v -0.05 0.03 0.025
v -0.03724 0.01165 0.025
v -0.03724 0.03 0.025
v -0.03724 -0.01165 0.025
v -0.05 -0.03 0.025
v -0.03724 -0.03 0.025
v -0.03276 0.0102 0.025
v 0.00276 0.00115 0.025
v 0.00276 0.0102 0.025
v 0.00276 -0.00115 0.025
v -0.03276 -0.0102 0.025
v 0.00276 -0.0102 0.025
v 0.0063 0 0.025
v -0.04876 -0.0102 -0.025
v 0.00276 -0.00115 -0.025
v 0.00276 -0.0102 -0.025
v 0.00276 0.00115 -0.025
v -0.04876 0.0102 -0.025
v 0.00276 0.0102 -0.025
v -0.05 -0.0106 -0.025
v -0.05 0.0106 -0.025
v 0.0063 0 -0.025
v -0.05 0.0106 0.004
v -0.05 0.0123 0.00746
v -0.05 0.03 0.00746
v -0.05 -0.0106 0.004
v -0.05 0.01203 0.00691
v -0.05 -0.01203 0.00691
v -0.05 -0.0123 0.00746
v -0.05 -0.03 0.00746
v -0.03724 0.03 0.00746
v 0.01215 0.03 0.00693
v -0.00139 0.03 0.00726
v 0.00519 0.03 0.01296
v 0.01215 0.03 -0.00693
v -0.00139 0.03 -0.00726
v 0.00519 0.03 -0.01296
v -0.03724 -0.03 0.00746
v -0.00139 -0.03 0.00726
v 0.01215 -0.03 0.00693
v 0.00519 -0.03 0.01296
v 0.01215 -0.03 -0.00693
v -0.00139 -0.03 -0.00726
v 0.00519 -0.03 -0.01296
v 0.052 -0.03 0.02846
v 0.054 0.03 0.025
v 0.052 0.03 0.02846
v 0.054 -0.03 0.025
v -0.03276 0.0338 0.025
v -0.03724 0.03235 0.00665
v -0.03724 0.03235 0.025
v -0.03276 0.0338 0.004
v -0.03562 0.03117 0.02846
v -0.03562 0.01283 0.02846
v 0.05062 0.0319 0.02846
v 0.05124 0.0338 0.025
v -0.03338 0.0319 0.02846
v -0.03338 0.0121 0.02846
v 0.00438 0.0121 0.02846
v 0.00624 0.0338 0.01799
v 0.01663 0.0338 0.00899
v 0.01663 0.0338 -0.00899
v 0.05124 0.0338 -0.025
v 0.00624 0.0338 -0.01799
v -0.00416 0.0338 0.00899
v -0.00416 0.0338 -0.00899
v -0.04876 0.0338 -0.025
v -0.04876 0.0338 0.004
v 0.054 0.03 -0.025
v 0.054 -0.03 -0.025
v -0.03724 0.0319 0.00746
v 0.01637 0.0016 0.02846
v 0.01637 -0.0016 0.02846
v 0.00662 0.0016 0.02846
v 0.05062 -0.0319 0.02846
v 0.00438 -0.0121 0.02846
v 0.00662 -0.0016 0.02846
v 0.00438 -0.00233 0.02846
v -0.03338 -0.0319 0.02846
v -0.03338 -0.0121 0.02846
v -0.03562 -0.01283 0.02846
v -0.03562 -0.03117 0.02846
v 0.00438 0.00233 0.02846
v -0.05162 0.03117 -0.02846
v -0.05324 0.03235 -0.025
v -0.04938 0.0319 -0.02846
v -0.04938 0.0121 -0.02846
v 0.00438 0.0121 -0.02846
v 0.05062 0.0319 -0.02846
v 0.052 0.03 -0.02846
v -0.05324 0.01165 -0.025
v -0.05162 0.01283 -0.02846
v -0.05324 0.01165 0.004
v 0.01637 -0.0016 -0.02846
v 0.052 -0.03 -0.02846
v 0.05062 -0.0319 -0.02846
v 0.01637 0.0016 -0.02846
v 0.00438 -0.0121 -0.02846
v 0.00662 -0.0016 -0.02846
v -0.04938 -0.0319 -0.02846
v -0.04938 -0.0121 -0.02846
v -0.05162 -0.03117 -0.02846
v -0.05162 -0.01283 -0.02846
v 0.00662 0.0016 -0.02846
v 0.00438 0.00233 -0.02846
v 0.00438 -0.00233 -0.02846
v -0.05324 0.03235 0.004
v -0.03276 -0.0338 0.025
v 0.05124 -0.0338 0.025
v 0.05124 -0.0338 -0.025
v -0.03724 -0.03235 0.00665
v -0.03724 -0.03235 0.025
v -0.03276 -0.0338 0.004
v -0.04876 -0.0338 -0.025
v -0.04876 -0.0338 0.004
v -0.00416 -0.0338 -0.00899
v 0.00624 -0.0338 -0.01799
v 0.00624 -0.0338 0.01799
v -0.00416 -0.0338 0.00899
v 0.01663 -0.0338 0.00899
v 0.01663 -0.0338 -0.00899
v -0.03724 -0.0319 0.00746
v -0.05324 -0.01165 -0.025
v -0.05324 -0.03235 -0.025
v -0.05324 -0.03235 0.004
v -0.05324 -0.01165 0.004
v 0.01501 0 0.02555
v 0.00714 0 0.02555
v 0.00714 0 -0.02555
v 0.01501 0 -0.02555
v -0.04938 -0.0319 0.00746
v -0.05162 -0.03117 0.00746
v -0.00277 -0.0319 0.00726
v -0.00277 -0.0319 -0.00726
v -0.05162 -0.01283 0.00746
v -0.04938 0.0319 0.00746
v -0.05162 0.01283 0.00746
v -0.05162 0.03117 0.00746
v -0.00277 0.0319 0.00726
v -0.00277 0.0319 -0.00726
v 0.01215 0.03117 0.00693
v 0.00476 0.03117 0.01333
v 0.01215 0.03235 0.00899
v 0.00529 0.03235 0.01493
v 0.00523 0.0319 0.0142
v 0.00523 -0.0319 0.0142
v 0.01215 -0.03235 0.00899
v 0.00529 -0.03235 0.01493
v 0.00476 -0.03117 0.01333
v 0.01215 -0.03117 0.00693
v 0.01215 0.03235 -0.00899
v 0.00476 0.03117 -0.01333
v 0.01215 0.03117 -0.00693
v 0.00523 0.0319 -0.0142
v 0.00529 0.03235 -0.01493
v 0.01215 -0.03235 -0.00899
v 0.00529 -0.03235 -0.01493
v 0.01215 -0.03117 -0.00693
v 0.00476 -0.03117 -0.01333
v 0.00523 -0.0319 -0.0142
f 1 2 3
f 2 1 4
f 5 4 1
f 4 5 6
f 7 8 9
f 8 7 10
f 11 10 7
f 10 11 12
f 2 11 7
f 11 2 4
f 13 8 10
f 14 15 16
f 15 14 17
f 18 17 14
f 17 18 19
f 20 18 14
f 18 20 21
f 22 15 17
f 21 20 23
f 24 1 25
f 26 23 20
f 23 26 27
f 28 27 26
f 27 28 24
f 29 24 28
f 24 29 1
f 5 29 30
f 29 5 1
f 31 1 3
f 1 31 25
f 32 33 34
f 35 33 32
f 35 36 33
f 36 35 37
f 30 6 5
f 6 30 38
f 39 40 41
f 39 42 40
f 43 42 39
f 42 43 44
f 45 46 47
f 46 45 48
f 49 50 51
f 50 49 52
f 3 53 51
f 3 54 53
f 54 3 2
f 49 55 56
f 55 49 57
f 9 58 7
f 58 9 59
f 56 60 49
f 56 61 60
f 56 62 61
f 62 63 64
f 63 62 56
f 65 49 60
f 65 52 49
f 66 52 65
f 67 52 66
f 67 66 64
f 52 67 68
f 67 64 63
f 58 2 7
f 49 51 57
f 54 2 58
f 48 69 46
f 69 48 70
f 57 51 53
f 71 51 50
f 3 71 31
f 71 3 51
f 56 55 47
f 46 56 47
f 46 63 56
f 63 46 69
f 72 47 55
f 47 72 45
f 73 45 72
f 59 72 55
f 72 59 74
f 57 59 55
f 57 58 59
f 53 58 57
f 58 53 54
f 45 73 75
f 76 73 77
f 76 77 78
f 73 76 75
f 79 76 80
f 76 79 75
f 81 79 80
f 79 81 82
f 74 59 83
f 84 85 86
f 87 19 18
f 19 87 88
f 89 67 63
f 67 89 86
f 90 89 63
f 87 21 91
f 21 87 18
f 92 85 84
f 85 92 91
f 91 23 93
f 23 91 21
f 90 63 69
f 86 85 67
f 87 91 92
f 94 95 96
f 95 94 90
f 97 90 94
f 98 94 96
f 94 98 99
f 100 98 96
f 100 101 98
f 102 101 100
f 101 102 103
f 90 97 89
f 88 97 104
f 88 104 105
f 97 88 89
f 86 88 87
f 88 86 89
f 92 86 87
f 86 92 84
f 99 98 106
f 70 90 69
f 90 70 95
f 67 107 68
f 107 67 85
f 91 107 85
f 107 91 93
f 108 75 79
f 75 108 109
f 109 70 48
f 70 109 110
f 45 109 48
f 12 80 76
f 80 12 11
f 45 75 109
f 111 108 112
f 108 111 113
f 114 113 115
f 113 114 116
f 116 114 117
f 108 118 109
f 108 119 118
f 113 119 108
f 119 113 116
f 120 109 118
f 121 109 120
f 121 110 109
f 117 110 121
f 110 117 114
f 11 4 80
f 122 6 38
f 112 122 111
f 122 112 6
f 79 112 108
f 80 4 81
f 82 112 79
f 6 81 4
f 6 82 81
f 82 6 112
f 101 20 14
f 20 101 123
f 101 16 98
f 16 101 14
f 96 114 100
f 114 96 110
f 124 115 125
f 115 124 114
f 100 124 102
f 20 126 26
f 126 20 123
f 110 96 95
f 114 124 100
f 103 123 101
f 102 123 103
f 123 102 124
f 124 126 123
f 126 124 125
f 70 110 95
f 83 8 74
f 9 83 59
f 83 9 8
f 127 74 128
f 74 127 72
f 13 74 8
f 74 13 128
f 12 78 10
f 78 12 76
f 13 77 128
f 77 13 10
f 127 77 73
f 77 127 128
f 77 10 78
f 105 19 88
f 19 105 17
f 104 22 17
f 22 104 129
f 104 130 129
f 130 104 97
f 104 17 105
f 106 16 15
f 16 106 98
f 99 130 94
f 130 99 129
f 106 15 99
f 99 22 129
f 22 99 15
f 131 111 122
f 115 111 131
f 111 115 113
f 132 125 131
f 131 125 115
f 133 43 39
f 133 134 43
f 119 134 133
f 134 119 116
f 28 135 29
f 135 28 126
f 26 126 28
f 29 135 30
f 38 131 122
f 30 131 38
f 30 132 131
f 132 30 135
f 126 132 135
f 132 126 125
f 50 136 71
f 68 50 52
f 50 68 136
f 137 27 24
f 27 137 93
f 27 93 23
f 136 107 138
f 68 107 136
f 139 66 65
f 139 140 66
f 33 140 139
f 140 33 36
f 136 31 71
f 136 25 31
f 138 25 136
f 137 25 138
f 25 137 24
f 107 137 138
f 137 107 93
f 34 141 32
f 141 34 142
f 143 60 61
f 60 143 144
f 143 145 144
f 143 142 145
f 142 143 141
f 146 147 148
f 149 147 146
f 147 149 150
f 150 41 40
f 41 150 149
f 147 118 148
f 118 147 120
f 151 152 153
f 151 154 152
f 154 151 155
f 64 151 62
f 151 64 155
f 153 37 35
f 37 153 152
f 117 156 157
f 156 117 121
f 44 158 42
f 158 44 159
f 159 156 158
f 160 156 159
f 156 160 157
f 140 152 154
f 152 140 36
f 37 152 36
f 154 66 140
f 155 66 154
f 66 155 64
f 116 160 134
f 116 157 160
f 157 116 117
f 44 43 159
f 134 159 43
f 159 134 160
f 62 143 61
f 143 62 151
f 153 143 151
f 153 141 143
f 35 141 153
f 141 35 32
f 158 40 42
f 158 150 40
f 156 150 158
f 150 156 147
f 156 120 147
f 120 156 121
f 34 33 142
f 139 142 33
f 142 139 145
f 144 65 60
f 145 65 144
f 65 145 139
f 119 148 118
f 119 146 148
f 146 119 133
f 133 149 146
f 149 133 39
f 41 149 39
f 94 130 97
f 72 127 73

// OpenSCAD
// Parameters
L = 0.1; //[0.05:0.2:0.001]
W = 0.06; //[0.03:0.12:0.001]
H = 0.05; //[0.025:0.1:0.001]
slot_L = 0.055; //[0.03:0.09:0.001]
slot_W = 0.028; //[0.012:0.045:0.001]
slot_offset_from_tip = 0.0; //[0.0:0.01:0.001]
tine_wall_min = 0.016; //[0.008:0.03:0.001]
end_round_R = 0.03; //[0.015:0.06:0.001]
chamfer_L = 0.015; //[0.005:0.03:0.001]
chamfer_drop = 0.02; //[0.005:0.04:0.001]
hex_flat_AF = 0.018; //[0.01:0.03:0.001]
hex_axis_d = 0.06; //[0.03:0.12:0.001]
hex_center_x_from_rounded_end = 0.02; //[0.005:0.04:0.001]
hex_center_z = 0.025; //[0.01:0.04:0.001]
eps = 0.001; //[0.0005:0.002:0.0005]
hole_leadin_L = 0.006; //[0.002:0.012:0.001]
hole_leadin_scale = 1.25; //[1.05:1.6:0.01]
tine_tip_R = 0.008; //[0.003:0.015:0.001]
edge_fillet_R = 0.004; //[0.001:0.01:0.001]

// Main prismatic body
module main_prismatic_body() {
  cube([L, W, H], center=true);
}

// Rounded end cap
module rounded_end_cap() {
  rotate([90, 0, 0])
    translate([L/2 - min(W/2, H/2, end_round_R), 0, 0])
      cylinder(r=min(W/2, H/2, end_round_R), h=W, center=true);
}

// Rectangular through slot for two tines
module rectangular_through_slot_two_tines() {
  translate([-L/2 + slot_offset_from_tip + (slot_L + eps)/2, 0, 0])
    cube([slot_L + eps, slot_W, H + 2*eps], center=true);
}

// Chamfered tapered end
module chamfered_tapered_end() {
  translate([-L/2 + (chamfer_L + eps)/2, 0, H/2 - (chamfer_drop + eps)/2])
    cube([chamfer_L + eps, W + 2*eps, chamfer_drop + eps], center=true);
}

// Transverse hex through hole
module transverse_hex_through_hole() {
  rotate([90, 0, 0])
    translate([L/2 - min(W/2, H/2, end_round_R) - hex_center_x_from_rounded_end, 0, -H/2 + hex_center_z])
      linear_extrude(height=hex_axis_d + 2*eps, center=true)
        polygon(points=[
          [hex_flat_AF/sqrt(3), hex_flat_AF/2],
          [0, hex_flat_AF],
          [-hex_flat_AF/sqrt(3), hex_flat_AF/2],
          [-hex_flat_AF/sqrt(3), -hex_flat_AF/2],
          [0, -hex_flat_AF],
          [hex_flat_AF/sqrt(3), -hex_flat_AF/2]
        ]);
}

// Small lead-in chamfers on hole (left and right)
module small_lead_in_chamfers_on_hole_left() {
  rotate([90, 0, 0])
    translate([L/2 - min(W/2, H/2, end_round_R) - hex_center_x_from_rounded_end, -W/2 + (hole_leadin_L + eps)/2, -H/2 + hex_center_z])
      linear_extrude(height=hole_leadin_L + eps, center=true)
        polygon(points=[
          [(hex_flat_AF*hole_leadin_scale)/sqrt(3), (hex_flat_AF*hole_leadin_scale)/2],
          [0, hex_flat_AF*hole_leadin_scale],
          [-(hex_flat_AF*hole_leadin_scale)/sqrt(3), (hex_flat_AF*hole_leadin_scale)/2],
          [-(hex_flat_AF*hole_leadin_scale)/sqrt(3), -(hex_flat_AF*hole_leadin_scale)/2],
          [0, -hex_flat_AF*hole_leadin_scale],
          [(hex_flat_AF*hole_leadin_scale)/sqrt(3), -(hex_flat_AF*hole_leadin_scale)/2]
        ]);
}

module small_lead_in_chamfers_on_hole_right() {
  rotate([90, 0, 0])
    translate([L/2 - min(W/2, H/2, end_round_R) - hex_center_x_from_rounded_end, W/2 - (hole_leadin_L + eps)/2, -H/2 + hex_center_z])
      linear_extrude(height=hole_leadin_L + eps, center=true)
        polygon(points=[
          [(hex_flat_AF*hole_leadin_scale)/sqrt(3), (hex_flat_AF*hole_leadin_scale)/2],
          [0, hex_flat_AF*hole_leadin_scale],
          [-(hex_flat_AF*hole_leadin_scale)/sqrt(3), (hex_flat_AF*hole_leadin_scale)/2],
          [-(hex_flat_AF*hole_leadin_scale)/sqrt(3), -(hex_flat_AF*hole_leadin_scale)/2],
          [0, -hex_flat_AF*hole_leadin_scale],
          [(hex_flat_AF*hole_leadin_scale)/sqrt(3), -(hex_flat_AF*hole_leadin_scale)/2]
        ]);
}

// Tine tip rounding spheres
module tine_tip_rounding_left_sphere() {
  translate([-L/2 + tine_tip_R, slot_W/2 + (W - slot_W)/4, 0])
    sphere(r=tine_tip_R, center=true);
}

module tine_tip_rounding_left_sphere_back() {
  translate([-L/2 + tine_tip_R + chamfer_L/2, slot_W/2 + (W - slot_W)/4, 0])
    sphere(r=tine_tip_R, center=true);
}

module tine_tip_rounding_right_sphere() {
  translate([-L/2 + tine_tip_R, -(slot_W/2 + (W - slot_W)/4), 0])
    sphere(r=tine_tip_R, center=true);
}

module tine_tip_rounding_right_sphere_back() {
  translate([-L/2 + tine_tip_R + chamfer_L/2, -(slot_W/2 + (W - slot_W)/4), 0])
    sphere(r=tine_tip_R, center=true);
}

// Edge fillets sphere
module edge_fillets_sphere() {
  sphere(r=edge_fillet_R, center=true);
}

// Assemble the clevis/fork bracket
module clevis_fork_bracket() {
  // Body with rounded end
  union() {
    main_prismatic_body();
    rounded_end_cap();
  }
  
  // Tine tip rounding
  hull() {
    tine_tip_rounding_left_sphere();
    tine_tip_rounding_left_sphere_back();
  }
  
  hull() {
    tine_tip_rounding_right_sphere();
    tine_tip_rounding_right_sphere_back();
  }
  
  // Body with tip rounding
  union() {
    main_prismatic_body();
    rounded_end_cap();
    hull() {
      tine_tip_rounding_left_sphere();
      tine_tip_rounding_left_sphere_back();
    }
    hull() {
      tine_tip_rounding_right_sphere();
      tine_tip_rounding_right_sphere_back();
    }
  }
  
  // Body minus slot
  difference() {
    union() {
      main_prismatic_body();
      rounded_end_cap();
      hull() {
        tine_tip_rounding_left_sphere();
        tine_tip_rounding_left_sphere_back();
      }
      hull() {
        tine_tip_rounding_right_sphere();
        tine_tip_rounding_right_sphere_back();
      }
    }
    rectangular_through_slot_two_tines();
  }
  
  // Body minus slot and taper
  difference() {
    difference() {
      union() {
        main_prismatic_body();
        rounded_end_cap();
        hull() {
          tine_tip_rounding_left_sphere();
          tine_tip_rounding_left_sphere_back();
        }
        hull() {
          tine_tip_rounding_right_sphere();
          tine_tip_rounding_right_sphere_back();
        }
      }
      rectangular_through_slot_two_tines();
    }
    chamfered_tapered_end();
  }
  
  // Body minus hex main
  difference() {
    difference() {
      difference() {
        union() {
          main_prismatic_body();
          rounded_end_cap();
          hull() {
            tine_tip_rounding_left_sphere();
            tine_tip_rounding_left_sphere_back();
          }
          hull() {
            tine_tip_rounding_right_sphere();
            tine_tip_rounding_right_sphere_back();
          }
        }
        rectangular_through_slot_two_tines();
      }
      chamfered_tapered_end();
    }
    transverse_hex_through_hole();
  }
  
  // Body minus hex with lead-ins
  difference() {
    difference() {
      difference() {
        difference() {
          union() {
            main_prismatic_body();
            rounded_end_cap();
            hull() {
              tine_tip_rounding_left_sphere();
              tine_tip_rounding_left_sphere_back();
            }
            hull() {
              tine_tip_rounding_right_sphere();
              tine_tip_rounding_right_sphere_back();
            }
          }
          rectangular_through_slot_two_tines();
        }
        chamfered_tapered_end();
      }
      transverse_hex_through_hole();
    }
    small_lead_in_chamfers_on_hole_left();
    small_lead_in_chamfers_on_hole_right();
  }
  
  // Edge fillets
  minkowski() {
    difference() {
      difference() {
        difference() {
          difference() {
            union() {
              main_prismatic_body();
              rounded_end_cap();
              hull() {
                tine_tip_rounding_left_sphere();
                tine_tip_rounding_left_sphere_back();
              }
              hull() {
                tine_tip_rounding_right_sphere();
                tine_tip_rounding_right_sphere_back();
              }
            }
            rectangular_through_slot_two_tines();
          }
          chamfered_tapered_end();
        }
        transverse_hex_through_hole();
      }
      small_lead_in_chamfers_on_hole_left();
      small_lead_in_chamfers_on_hole_right();
    }
    edge_fillets_sphere();
  }
}

// Render the final clevis/fork bracket
clevis_fork_bracket();
